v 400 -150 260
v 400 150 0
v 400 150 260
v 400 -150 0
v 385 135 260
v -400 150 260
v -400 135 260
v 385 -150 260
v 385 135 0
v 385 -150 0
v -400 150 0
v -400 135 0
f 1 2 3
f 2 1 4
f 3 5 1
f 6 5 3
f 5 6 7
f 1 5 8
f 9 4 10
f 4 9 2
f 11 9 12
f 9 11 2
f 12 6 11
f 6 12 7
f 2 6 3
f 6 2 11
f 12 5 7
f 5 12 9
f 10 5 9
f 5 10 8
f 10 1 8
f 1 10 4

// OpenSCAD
module terracerailing(width=300, length=800, railing_thickness=15, railing_height=260) 
{
    translate([0,width/2-railing_thickness/2, railing_height/2]) cube([length, railing_thickness, railing_height],center=true);
        
    /* translate([0,-width/2+railing_thickness/2, railing_height/2]) cube([length, railing_thickness, railing_height],center=true); */
    
    translate([length/2-railing_thickness/2, 0, railing_height/2]) cube([railing_thickness, width, railing_height],center=true);
    
    /* translate([-length/2+railing_thickness/2, 0, railing_height/2]) cube([railing_thickness, width, railing_height],center=true); */
}

terracerailing();
